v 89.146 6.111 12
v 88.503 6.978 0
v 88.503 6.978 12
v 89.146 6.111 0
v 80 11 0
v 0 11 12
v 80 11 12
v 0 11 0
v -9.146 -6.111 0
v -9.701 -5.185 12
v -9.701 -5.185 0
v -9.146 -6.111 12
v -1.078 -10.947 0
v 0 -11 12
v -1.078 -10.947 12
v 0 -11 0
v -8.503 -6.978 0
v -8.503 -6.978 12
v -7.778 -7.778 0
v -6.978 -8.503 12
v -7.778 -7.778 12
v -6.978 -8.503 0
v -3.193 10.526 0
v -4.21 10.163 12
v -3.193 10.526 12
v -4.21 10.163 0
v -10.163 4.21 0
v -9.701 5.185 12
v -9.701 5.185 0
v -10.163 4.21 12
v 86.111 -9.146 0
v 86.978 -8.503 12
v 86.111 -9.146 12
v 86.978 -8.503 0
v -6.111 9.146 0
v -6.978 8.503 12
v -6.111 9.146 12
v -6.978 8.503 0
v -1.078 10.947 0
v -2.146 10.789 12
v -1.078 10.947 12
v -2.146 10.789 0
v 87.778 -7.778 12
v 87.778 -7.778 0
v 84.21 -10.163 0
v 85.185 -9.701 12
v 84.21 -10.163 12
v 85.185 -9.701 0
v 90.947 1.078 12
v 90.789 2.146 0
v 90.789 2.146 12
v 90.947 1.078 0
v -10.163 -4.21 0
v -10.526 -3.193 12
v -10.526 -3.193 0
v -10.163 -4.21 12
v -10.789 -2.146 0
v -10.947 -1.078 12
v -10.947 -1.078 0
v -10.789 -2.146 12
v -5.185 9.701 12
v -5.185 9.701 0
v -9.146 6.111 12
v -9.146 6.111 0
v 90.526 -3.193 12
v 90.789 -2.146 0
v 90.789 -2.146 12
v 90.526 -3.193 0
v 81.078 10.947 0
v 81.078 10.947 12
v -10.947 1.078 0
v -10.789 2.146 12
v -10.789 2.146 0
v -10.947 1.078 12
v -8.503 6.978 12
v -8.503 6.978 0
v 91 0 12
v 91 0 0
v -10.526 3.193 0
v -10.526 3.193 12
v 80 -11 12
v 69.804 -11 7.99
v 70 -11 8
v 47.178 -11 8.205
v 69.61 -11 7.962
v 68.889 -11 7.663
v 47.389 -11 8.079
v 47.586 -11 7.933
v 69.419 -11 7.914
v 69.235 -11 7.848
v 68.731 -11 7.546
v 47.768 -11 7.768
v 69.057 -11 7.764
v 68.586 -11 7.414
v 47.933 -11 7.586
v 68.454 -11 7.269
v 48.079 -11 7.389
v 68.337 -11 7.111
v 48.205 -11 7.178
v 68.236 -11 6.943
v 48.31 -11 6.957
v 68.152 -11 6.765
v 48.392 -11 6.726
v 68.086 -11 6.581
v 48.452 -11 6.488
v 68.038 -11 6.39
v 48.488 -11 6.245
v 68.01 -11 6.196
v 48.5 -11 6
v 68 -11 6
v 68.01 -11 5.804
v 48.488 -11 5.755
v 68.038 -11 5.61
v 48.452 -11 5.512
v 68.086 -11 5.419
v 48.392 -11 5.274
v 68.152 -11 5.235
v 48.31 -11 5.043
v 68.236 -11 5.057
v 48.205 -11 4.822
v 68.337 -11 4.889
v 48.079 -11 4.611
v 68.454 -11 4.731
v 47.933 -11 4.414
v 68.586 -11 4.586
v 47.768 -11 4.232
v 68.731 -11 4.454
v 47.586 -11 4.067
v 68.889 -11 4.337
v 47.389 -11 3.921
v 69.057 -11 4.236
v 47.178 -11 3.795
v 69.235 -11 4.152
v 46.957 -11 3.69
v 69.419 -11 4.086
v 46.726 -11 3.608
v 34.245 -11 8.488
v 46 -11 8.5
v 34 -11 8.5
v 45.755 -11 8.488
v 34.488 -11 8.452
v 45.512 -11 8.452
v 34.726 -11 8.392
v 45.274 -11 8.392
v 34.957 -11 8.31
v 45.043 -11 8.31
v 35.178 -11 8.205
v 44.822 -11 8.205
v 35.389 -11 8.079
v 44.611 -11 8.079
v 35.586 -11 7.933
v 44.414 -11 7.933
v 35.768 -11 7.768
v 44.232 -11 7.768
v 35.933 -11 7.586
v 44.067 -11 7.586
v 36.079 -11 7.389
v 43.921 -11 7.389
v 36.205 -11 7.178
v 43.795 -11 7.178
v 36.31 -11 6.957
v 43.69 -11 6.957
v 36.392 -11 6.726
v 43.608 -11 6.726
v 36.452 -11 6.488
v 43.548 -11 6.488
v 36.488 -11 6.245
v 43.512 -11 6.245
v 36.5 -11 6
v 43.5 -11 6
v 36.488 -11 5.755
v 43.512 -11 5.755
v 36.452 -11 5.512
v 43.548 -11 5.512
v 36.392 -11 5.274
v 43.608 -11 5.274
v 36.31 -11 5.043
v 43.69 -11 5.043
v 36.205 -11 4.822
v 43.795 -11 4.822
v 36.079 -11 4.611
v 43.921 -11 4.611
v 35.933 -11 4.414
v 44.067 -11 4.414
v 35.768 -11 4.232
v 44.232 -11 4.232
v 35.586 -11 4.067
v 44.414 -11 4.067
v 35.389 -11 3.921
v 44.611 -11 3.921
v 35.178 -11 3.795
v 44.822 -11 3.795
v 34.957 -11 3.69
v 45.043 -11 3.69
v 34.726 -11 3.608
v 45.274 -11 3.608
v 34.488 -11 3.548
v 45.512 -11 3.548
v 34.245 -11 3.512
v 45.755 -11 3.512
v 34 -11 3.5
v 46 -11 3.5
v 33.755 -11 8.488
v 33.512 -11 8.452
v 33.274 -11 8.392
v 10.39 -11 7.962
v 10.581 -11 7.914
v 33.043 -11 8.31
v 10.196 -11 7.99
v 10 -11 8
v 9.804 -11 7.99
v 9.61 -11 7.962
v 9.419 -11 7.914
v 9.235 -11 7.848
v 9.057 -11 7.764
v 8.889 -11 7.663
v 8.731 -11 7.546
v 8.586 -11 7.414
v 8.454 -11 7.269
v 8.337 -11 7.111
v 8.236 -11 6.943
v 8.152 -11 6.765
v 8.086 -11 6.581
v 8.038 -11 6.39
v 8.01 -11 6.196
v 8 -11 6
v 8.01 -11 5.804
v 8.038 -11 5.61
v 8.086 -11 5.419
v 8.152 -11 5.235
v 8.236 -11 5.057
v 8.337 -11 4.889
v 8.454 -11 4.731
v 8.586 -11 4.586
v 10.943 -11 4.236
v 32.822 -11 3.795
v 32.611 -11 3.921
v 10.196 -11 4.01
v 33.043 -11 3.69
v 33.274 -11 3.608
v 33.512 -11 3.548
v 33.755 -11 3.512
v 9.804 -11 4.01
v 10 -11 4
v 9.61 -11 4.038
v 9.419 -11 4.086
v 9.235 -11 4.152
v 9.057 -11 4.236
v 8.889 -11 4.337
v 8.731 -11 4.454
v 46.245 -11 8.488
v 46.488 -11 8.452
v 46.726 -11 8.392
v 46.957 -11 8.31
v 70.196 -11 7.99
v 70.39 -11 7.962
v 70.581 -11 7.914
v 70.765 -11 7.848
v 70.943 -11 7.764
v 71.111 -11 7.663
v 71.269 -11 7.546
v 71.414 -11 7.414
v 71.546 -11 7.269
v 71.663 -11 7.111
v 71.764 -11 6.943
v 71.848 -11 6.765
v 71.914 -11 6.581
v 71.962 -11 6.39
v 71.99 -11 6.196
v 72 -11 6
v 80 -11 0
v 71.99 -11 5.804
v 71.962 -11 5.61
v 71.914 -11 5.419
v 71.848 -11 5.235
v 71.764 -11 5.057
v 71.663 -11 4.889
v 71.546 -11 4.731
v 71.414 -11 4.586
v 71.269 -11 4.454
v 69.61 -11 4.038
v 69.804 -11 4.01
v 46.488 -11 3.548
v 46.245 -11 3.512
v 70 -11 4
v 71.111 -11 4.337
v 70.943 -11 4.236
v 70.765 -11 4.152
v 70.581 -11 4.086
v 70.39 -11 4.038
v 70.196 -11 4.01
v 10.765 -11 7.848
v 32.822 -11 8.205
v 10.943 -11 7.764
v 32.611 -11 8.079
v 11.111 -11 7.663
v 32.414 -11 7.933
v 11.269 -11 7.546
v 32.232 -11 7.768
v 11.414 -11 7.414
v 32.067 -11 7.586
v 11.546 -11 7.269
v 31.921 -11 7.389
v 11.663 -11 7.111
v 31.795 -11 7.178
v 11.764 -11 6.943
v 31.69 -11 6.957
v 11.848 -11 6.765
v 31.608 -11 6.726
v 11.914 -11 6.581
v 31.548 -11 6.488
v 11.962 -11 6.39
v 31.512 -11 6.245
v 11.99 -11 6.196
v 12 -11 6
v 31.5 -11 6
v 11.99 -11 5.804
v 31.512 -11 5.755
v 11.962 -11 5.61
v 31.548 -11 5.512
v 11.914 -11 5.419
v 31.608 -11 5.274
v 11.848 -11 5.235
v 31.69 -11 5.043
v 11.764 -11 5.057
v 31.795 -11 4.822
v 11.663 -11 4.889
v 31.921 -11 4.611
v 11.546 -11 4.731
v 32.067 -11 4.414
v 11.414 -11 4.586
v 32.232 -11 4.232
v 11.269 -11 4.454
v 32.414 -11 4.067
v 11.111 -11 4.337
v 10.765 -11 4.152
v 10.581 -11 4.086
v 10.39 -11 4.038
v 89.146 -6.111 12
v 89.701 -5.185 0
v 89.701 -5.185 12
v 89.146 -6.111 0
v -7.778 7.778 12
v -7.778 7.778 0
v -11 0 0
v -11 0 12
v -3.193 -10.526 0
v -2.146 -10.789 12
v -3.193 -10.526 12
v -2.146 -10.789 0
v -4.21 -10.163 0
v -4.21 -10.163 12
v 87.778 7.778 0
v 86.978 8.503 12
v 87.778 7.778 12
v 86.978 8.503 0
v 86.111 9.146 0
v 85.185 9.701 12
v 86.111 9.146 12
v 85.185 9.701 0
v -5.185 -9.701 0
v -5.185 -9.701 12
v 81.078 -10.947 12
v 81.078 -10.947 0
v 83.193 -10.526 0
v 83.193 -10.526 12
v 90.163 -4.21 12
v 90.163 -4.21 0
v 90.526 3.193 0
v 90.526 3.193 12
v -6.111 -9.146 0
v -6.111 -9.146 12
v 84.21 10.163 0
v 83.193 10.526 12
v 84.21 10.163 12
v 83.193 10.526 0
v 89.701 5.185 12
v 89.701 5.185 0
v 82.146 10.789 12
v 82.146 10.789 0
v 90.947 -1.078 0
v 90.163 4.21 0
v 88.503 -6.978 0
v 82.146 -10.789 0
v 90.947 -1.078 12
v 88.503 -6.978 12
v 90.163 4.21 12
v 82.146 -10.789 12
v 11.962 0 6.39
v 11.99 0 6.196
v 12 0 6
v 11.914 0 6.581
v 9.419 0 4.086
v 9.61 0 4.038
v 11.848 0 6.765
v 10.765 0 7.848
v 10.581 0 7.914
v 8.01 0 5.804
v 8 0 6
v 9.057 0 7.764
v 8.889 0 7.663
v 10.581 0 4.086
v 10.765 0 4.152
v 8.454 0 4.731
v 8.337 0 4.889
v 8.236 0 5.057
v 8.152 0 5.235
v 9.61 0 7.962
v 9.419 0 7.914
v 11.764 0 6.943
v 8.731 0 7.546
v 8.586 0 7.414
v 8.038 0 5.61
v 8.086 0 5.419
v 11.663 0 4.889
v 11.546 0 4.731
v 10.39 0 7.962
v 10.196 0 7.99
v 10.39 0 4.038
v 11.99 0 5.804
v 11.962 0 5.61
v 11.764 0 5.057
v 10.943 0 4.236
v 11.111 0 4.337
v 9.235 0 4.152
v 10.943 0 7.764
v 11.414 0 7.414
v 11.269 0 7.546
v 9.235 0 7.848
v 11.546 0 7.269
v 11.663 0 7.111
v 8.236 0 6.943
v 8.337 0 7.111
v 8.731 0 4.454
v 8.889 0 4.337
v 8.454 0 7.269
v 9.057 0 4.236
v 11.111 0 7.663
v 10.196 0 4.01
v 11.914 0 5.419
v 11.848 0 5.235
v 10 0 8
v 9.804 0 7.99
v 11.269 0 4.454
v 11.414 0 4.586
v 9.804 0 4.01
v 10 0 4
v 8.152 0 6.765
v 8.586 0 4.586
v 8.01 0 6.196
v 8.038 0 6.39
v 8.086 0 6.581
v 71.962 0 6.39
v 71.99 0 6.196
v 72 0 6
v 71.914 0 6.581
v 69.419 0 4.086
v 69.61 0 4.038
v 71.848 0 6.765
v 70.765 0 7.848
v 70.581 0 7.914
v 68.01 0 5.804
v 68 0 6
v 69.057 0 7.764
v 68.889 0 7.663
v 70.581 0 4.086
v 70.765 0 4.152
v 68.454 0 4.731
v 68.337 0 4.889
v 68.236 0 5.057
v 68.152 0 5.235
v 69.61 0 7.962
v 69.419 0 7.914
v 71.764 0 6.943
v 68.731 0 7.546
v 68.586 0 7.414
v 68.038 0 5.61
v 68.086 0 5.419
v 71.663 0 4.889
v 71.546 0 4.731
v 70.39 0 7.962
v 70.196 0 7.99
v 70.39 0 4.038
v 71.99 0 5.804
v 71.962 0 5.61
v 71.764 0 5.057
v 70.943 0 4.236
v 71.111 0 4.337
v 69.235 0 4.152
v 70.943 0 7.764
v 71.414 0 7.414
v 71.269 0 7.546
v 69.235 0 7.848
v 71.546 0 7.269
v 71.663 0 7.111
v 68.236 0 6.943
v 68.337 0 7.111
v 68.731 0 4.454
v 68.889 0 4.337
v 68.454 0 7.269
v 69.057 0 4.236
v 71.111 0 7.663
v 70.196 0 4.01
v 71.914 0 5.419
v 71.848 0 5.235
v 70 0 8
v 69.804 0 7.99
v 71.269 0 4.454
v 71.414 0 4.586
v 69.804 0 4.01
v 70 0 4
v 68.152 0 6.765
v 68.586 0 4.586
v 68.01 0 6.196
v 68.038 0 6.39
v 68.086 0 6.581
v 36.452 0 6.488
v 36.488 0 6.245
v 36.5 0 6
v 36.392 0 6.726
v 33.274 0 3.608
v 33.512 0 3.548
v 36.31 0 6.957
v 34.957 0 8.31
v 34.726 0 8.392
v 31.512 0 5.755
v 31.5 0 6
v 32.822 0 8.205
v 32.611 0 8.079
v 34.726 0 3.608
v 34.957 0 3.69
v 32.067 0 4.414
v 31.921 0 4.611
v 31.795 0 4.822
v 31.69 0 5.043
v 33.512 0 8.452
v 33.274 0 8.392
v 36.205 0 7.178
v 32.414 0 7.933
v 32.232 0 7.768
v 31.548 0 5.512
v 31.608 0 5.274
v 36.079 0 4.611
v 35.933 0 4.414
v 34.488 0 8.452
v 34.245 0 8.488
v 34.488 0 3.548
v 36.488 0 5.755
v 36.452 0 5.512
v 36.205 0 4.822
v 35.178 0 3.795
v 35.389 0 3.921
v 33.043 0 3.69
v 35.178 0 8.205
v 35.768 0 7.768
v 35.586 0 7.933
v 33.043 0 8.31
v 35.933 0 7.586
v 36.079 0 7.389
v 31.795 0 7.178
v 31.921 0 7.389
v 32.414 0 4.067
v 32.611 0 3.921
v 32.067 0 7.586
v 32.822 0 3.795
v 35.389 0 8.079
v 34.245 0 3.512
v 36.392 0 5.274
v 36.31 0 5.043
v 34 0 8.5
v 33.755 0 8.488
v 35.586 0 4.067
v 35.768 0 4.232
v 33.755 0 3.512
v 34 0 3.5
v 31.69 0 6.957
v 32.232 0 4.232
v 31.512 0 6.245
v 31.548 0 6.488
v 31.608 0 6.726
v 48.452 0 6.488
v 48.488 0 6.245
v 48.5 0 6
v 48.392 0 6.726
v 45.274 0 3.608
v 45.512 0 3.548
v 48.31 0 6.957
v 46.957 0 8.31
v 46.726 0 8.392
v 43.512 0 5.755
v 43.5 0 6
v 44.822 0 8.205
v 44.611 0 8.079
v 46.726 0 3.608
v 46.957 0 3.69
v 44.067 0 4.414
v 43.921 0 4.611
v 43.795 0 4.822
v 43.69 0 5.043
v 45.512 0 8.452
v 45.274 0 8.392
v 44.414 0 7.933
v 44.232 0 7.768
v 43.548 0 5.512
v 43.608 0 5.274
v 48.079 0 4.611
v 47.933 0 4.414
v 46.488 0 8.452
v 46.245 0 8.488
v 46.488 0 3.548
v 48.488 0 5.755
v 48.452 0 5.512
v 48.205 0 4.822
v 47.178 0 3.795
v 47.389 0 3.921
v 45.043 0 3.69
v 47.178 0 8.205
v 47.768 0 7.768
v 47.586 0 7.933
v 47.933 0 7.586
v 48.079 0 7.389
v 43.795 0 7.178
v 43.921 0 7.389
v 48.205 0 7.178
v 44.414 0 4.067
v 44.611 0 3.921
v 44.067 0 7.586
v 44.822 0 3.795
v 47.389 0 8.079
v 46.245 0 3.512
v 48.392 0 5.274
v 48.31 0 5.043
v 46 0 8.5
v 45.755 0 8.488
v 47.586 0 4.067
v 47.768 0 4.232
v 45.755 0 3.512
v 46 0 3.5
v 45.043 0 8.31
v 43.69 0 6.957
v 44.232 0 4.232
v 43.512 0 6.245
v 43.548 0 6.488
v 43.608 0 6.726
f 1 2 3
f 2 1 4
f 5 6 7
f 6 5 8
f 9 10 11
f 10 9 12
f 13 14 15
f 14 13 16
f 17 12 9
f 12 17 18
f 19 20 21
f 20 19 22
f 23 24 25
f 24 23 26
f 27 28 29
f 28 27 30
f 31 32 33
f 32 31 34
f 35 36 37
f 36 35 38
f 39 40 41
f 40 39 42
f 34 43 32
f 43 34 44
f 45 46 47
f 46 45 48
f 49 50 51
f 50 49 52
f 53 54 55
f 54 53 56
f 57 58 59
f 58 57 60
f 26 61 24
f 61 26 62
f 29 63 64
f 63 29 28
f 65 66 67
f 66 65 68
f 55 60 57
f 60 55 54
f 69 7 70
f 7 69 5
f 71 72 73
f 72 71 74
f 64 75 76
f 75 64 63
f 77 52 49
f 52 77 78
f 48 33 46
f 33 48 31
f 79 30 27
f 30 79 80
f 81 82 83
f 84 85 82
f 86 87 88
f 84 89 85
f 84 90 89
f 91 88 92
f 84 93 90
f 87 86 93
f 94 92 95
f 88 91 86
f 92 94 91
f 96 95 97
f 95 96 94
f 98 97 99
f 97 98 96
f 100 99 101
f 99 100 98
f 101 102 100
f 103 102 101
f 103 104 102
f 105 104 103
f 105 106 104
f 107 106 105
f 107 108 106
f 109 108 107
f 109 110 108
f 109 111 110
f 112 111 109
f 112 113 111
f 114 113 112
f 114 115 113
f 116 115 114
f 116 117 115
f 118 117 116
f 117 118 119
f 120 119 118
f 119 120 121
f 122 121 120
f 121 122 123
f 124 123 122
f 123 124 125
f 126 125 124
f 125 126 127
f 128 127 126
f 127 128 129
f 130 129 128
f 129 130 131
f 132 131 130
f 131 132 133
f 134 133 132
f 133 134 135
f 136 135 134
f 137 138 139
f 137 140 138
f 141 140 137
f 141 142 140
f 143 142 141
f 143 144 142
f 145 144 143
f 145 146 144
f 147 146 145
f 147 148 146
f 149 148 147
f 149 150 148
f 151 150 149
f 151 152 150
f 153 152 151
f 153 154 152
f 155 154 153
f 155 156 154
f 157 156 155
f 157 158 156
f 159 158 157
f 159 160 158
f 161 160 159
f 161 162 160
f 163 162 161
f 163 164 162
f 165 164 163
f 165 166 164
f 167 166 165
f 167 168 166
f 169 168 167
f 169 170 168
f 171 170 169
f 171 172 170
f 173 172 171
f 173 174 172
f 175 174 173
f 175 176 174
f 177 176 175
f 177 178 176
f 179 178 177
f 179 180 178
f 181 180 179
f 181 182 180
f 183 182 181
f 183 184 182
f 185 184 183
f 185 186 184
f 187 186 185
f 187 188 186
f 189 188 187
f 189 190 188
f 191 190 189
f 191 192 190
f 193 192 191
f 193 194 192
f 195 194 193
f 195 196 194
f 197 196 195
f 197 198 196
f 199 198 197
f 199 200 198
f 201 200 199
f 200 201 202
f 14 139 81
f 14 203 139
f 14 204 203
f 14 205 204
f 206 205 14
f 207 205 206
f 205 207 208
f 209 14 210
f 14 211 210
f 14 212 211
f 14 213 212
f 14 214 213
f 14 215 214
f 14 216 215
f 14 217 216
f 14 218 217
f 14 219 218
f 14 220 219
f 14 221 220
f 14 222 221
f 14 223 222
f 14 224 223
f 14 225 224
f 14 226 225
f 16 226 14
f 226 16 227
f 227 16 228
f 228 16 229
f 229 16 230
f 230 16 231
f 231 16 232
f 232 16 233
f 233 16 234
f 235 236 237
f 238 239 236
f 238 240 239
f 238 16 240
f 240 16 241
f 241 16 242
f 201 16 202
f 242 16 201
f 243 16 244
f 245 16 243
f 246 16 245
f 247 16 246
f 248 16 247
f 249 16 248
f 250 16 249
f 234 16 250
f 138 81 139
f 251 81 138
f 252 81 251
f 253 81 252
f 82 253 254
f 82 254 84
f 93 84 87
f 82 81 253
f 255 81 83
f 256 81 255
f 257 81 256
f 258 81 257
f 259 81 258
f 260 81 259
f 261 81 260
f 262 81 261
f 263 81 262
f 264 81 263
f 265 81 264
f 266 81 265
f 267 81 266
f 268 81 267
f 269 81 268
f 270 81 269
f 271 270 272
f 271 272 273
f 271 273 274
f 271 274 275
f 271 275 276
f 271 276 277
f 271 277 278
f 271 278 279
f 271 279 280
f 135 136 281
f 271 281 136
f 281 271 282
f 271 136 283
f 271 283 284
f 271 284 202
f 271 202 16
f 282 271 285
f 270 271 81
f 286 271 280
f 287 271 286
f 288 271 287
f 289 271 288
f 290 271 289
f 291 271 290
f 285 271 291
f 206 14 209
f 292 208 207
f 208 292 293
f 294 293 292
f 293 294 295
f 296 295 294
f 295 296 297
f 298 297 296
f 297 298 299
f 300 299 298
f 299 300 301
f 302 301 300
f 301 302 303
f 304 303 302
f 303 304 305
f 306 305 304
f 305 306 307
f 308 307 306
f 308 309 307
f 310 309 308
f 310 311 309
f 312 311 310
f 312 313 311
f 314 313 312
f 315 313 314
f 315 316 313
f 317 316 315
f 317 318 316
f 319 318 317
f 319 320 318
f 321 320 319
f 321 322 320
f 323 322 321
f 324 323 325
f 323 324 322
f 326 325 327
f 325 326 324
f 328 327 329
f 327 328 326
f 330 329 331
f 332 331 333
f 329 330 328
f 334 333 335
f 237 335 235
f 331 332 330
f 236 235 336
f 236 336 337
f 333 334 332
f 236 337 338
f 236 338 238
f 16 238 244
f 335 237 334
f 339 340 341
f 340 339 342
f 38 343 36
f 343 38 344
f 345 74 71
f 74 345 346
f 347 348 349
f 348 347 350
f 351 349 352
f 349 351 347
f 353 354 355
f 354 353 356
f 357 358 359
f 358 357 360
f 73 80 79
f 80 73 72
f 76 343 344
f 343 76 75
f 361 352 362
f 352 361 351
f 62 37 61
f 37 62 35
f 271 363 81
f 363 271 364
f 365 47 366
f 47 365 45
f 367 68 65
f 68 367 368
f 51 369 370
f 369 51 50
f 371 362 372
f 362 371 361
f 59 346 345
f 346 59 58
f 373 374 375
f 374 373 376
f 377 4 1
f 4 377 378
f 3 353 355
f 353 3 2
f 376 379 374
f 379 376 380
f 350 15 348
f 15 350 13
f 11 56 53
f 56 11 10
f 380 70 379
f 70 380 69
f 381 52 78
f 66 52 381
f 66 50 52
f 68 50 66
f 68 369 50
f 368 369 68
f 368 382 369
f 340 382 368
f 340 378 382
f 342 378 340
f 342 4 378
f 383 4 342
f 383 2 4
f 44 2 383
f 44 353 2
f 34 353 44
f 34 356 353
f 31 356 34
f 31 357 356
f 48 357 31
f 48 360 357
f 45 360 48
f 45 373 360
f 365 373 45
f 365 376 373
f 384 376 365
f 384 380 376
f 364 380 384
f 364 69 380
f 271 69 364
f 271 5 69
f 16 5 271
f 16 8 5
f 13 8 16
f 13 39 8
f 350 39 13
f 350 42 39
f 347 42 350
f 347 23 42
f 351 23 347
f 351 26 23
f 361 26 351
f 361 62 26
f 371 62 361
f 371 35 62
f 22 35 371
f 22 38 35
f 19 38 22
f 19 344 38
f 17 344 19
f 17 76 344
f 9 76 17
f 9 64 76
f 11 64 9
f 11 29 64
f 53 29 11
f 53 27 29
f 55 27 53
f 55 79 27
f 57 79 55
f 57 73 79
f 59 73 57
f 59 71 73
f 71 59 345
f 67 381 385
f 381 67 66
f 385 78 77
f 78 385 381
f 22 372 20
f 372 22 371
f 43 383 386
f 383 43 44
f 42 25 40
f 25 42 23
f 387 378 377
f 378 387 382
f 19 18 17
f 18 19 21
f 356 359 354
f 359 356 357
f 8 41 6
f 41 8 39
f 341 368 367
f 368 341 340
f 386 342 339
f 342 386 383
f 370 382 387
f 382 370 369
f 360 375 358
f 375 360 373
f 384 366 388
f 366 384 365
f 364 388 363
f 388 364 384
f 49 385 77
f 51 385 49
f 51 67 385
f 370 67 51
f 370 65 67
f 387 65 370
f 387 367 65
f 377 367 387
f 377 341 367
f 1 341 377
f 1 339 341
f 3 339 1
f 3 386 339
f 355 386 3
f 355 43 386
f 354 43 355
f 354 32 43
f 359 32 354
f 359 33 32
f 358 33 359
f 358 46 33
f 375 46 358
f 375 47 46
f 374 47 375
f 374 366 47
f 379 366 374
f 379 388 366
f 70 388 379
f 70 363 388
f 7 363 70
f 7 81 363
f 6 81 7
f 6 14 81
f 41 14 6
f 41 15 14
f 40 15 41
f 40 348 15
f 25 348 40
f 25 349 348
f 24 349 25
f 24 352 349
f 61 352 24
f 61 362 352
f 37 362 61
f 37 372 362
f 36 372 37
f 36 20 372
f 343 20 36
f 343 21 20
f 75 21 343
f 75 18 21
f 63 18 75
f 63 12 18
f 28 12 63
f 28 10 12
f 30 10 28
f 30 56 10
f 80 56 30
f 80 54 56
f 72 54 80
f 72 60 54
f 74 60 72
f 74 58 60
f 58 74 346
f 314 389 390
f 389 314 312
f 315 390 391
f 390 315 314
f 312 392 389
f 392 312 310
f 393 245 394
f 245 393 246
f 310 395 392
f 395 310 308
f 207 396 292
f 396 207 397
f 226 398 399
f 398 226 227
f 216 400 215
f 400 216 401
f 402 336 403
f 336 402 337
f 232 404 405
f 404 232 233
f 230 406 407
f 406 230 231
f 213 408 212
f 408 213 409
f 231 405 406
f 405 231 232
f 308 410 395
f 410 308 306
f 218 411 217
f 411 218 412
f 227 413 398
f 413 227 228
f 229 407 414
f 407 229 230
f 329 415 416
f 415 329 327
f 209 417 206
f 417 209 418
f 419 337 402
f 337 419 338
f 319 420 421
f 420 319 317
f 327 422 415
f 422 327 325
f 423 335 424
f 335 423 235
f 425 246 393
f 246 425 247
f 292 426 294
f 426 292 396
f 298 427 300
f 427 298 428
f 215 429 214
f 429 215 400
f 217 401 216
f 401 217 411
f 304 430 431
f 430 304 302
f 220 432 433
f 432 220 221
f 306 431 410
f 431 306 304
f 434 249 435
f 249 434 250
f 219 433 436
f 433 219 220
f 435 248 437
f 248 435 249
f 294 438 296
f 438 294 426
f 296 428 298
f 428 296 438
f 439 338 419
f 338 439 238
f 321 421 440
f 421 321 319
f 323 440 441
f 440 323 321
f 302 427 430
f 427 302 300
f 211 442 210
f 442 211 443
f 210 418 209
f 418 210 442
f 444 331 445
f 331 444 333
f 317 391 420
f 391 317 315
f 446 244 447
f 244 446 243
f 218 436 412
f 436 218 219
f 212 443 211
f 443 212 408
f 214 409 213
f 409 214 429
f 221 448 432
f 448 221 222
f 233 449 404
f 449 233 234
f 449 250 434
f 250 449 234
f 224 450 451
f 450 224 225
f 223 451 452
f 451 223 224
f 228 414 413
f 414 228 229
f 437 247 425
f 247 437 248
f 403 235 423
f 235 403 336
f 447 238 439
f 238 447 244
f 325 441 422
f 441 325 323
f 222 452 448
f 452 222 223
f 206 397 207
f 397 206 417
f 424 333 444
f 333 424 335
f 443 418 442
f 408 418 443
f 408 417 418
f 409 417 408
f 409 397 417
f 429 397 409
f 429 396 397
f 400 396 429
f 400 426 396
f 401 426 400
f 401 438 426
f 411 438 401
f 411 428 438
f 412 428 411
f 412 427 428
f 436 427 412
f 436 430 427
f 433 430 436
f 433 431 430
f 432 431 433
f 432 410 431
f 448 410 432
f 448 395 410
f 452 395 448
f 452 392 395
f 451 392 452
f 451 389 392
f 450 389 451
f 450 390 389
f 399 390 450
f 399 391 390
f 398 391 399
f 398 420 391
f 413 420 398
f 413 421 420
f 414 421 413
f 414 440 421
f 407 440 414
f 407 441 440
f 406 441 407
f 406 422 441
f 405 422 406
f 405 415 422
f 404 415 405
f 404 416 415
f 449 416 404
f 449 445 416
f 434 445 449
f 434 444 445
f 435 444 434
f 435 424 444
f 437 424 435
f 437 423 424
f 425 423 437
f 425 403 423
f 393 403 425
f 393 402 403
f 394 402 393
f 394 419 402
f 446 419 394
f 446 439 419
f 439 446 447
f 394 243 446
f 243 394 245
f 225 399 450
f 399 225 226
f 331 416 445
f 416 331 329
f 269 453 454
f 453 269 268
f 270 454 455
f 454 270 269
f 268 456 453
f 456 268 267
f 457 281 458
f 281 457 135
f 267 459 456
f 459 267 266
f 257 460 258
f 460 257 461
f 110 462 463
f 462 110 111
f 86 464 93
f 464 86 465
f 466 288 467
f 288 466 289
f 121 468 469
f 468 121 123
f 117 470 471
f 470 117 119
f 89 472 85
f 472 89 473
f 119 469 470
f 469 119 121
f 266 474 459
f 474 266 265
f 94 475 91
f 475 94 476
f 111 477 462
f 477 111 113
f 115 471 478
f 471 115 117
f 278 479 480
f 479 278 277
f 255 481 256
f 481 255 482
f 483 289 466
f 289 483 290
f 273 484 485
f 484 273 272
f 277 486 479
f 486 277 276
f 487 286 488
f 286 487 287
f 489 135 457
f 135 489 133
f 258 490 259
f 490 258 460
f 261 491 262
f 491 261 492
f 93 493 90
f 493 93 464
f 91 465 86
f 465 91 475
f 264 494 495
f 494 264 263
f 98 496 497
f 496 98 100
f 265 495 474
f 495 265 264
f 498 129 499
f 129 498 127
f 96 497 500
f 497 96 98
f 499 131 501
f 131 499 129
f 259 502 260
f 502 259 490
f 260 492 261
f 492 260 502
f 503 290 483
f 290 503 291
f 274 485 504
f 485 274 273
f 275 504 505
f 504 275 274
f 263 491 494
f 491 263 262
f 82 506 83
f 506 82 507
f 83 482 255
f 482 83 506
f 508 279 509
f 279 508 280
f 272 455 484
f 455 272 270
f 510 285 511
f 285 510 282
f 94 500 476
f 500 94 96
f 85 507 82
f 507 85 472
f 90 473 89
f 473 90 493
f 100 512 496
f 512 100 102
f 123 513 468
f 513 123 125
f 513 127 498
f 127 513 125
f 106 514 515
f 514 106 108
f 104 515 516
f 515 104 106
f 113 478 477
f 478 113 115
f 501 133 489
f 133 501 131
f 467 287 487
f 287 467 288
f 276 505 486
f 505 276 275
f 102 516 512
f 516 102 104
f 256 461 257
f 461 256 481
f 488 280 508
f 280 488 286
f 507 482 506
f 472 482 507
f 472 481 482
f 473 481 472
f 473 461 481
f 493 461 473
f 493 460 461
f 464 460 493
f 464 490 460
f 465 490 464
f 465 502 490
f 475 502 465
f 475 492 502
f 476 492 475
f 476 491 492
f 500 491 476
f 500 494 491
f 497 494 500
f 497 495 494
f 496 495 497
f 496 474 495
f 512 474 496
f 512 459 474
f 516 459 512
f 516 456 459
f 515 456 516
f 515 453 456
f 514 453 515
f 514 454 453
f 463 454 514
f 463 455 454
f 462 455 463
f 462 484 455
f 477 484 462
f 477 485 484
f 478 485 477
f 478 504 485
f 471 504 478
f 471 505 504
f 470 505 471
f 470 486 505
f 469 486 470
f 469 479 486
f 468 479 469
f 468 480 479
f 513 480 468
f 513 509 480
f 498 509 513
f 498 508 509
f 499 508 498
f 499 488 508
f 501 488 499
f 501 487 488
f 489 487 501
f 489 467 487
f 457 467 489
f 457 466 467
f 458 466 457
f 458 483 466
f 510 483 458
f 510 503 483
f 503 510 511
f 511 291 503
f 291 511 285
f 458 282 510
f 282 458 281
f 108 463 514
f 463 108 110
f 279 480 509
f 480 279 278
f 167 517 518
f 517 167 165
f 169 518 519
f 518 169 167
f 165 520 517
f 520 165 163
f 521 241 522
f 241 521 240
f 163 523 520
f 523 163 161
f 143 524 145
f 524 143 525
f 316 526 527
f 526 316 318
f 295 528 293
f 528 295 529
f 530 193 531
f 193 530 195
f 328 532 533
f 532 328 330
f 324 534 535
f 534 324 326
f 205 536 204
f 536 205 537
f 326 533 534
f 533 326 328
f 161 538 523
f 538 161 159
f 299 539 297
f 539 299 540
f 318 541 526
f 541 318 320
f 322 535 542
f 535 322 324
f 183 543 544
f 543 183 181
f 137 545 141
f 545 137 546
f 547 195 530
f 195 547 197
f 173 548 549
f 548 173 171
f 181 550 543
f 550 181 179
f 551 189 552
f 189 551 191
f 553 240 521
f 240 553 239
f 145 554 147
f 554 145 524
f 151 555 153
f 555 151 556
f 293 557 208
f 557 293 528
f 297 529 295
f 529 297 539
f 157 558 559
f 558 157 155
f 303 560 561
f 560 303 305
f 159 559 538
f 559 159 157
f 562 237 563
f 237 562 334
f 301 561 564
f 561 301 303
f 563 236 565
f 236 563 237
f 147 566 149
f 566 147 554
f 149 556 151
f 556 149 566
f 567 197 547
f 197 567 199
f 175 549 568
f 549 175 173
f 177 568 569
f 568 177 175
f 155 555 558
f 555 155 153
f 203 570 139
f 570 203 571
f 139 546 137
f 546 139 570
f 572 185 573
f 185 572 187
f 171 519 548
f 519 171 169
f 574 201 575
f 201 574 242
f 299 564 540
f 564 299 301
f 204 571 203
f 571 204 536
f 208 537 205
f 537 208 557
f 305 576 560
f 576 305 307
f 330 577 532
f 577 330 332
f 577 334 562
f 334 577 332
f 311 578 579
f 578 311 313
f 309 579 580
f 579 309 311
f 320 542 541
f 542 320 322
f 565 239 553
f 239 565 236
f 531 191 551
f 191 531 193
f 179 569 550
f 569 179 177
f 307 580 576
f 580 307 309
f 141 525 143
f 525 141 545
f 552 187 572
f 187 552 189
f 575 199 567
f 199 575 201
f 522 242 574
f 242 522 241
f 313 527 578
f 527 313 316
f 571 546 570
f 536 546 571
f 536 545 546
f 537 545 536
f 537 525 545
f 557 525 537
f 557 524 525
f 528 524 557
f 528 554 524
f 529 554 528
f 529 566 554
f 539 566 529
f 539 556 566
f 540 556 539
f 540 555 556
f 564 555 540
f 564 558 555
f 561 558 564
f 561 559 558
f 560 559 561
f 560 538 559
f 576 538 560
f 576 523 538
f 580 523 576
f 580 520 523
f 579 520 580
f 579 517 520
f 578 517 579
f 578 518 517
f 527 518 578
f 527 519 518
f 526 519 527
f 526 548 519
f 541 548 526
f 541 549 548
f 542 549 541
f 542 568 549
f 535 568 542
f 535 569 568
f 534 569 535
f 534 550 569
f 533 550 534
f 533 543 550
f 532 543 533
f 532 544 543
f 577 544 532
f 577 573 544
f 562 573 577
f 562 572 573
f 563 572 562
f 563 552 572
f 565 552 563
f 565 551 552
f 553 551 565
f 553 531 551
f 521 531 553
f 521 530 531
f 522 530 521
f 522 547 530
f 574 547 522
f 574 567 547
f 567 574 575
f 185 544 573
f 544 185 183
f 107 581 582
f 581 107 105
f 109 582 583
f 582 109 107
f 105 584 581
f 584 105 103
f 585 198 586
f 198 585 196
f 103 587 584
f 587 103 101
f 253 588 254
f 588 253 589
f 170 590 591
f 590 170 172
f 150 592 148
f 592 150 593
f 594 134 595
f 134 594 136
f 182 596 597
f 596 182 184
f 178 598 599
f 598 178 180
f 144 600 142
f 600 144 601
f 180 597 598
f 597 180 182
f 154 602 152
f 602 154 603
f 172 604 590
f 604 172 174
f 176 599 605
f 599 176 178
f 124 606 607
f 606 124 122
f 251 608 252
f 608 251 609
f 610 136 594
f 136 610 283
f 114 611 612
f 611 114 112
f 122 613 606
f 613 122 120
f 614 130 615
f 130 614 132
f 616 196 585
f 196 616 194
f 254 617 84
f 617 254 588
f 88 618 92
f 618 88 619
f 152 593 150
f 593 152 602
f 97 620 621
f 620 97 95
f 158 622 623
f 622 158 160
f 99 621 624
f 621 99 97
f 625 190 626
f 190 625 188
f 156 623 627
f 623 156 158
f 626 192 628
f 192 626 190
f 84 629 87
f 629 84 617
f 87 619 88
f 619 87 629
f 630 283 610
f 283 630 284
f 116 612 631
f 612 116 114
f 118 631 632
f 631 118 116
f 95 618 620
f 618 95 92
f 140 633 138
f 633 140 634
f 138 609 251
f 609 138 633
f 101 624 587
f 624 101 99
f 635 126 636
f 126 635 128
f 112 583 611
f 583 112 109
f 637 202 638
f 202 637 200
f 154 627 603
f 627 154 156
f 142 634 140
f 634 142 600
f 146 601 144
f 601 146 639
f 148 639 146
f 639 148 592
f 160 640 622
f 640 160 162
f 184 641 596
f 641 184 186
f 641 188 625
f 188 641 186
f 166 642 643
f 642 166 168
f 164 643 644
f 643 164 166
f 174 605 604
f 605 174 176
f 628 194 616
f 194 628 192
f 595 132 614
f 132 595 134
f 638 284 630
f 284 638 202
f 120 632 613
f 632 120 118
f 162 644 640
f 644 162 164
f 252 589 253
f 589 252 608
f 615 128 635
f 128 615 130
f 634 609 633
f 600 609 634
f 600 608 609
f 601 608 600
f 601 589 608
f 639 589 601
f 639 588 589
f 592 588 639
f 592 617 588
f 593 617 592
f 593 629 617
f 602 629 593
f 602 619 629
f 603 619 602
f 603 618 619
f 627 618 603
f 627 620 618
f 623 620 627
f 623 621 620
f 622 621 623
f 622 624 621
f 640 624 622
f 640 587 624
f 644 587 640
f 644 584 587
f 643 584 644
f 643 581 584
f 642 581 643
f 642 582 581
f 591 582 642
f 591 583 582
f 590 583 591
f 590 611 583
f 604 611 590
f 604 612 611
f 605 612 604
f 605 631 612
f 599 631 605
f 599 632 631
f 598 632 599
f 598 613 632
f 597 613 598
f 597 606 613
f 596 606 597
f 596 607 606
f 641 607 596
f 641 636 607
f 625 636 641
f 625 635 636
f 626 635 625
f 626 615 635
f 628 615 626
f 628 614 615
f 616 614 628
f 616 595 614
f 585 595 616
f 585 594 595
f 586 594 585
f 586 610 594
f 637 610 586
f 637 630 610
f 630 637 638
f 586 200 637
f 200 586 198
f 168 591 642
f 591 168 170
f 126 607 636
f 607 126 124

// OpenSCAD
// Dipole antenna feed point insulators
// All dimensions in mm. Designed for printers up to 200x200x200.

$fn = 64;

// Center-feed insulator with two tie holes and two feed holes.
module center_feed_insulator(body_len=80, body_w=22, body_h=12,
                             hole_d=4, feed_d=5, edge=10) {
    difference() {
        hull() {
            translate([0, 0, 0]) cylinder(h=body_h, r=body_w/2);
            translate([body_len, 0, 0]) cylinder(h=body_h, r=body_w/2);
        }
        // End tie holes
        translate([edge, 0, body_h/2]) rotate([90, 0, 0]) cylinder(h=body_w+2, r=hole_d/2);
        translate([body_len - edge, 0, body_h/2]) rotate([90, 0, 0]) cylinder(h=body_w+2, r=hole_d/2);
        // Two feed holes centered
        translate([body_len/2 - 6, 0, body_h/2]) rotate([90, 0, 0]) cylinder(h=body_w+2, r=feed_d/2);
        translate([body_len/2 + 6, 0, body_h/2]) rotate([90, 0, 0]) cylinder(h=body_w+2, r=feed_d/2);
    }
}

// Preview layout
center_feed_insulator();
